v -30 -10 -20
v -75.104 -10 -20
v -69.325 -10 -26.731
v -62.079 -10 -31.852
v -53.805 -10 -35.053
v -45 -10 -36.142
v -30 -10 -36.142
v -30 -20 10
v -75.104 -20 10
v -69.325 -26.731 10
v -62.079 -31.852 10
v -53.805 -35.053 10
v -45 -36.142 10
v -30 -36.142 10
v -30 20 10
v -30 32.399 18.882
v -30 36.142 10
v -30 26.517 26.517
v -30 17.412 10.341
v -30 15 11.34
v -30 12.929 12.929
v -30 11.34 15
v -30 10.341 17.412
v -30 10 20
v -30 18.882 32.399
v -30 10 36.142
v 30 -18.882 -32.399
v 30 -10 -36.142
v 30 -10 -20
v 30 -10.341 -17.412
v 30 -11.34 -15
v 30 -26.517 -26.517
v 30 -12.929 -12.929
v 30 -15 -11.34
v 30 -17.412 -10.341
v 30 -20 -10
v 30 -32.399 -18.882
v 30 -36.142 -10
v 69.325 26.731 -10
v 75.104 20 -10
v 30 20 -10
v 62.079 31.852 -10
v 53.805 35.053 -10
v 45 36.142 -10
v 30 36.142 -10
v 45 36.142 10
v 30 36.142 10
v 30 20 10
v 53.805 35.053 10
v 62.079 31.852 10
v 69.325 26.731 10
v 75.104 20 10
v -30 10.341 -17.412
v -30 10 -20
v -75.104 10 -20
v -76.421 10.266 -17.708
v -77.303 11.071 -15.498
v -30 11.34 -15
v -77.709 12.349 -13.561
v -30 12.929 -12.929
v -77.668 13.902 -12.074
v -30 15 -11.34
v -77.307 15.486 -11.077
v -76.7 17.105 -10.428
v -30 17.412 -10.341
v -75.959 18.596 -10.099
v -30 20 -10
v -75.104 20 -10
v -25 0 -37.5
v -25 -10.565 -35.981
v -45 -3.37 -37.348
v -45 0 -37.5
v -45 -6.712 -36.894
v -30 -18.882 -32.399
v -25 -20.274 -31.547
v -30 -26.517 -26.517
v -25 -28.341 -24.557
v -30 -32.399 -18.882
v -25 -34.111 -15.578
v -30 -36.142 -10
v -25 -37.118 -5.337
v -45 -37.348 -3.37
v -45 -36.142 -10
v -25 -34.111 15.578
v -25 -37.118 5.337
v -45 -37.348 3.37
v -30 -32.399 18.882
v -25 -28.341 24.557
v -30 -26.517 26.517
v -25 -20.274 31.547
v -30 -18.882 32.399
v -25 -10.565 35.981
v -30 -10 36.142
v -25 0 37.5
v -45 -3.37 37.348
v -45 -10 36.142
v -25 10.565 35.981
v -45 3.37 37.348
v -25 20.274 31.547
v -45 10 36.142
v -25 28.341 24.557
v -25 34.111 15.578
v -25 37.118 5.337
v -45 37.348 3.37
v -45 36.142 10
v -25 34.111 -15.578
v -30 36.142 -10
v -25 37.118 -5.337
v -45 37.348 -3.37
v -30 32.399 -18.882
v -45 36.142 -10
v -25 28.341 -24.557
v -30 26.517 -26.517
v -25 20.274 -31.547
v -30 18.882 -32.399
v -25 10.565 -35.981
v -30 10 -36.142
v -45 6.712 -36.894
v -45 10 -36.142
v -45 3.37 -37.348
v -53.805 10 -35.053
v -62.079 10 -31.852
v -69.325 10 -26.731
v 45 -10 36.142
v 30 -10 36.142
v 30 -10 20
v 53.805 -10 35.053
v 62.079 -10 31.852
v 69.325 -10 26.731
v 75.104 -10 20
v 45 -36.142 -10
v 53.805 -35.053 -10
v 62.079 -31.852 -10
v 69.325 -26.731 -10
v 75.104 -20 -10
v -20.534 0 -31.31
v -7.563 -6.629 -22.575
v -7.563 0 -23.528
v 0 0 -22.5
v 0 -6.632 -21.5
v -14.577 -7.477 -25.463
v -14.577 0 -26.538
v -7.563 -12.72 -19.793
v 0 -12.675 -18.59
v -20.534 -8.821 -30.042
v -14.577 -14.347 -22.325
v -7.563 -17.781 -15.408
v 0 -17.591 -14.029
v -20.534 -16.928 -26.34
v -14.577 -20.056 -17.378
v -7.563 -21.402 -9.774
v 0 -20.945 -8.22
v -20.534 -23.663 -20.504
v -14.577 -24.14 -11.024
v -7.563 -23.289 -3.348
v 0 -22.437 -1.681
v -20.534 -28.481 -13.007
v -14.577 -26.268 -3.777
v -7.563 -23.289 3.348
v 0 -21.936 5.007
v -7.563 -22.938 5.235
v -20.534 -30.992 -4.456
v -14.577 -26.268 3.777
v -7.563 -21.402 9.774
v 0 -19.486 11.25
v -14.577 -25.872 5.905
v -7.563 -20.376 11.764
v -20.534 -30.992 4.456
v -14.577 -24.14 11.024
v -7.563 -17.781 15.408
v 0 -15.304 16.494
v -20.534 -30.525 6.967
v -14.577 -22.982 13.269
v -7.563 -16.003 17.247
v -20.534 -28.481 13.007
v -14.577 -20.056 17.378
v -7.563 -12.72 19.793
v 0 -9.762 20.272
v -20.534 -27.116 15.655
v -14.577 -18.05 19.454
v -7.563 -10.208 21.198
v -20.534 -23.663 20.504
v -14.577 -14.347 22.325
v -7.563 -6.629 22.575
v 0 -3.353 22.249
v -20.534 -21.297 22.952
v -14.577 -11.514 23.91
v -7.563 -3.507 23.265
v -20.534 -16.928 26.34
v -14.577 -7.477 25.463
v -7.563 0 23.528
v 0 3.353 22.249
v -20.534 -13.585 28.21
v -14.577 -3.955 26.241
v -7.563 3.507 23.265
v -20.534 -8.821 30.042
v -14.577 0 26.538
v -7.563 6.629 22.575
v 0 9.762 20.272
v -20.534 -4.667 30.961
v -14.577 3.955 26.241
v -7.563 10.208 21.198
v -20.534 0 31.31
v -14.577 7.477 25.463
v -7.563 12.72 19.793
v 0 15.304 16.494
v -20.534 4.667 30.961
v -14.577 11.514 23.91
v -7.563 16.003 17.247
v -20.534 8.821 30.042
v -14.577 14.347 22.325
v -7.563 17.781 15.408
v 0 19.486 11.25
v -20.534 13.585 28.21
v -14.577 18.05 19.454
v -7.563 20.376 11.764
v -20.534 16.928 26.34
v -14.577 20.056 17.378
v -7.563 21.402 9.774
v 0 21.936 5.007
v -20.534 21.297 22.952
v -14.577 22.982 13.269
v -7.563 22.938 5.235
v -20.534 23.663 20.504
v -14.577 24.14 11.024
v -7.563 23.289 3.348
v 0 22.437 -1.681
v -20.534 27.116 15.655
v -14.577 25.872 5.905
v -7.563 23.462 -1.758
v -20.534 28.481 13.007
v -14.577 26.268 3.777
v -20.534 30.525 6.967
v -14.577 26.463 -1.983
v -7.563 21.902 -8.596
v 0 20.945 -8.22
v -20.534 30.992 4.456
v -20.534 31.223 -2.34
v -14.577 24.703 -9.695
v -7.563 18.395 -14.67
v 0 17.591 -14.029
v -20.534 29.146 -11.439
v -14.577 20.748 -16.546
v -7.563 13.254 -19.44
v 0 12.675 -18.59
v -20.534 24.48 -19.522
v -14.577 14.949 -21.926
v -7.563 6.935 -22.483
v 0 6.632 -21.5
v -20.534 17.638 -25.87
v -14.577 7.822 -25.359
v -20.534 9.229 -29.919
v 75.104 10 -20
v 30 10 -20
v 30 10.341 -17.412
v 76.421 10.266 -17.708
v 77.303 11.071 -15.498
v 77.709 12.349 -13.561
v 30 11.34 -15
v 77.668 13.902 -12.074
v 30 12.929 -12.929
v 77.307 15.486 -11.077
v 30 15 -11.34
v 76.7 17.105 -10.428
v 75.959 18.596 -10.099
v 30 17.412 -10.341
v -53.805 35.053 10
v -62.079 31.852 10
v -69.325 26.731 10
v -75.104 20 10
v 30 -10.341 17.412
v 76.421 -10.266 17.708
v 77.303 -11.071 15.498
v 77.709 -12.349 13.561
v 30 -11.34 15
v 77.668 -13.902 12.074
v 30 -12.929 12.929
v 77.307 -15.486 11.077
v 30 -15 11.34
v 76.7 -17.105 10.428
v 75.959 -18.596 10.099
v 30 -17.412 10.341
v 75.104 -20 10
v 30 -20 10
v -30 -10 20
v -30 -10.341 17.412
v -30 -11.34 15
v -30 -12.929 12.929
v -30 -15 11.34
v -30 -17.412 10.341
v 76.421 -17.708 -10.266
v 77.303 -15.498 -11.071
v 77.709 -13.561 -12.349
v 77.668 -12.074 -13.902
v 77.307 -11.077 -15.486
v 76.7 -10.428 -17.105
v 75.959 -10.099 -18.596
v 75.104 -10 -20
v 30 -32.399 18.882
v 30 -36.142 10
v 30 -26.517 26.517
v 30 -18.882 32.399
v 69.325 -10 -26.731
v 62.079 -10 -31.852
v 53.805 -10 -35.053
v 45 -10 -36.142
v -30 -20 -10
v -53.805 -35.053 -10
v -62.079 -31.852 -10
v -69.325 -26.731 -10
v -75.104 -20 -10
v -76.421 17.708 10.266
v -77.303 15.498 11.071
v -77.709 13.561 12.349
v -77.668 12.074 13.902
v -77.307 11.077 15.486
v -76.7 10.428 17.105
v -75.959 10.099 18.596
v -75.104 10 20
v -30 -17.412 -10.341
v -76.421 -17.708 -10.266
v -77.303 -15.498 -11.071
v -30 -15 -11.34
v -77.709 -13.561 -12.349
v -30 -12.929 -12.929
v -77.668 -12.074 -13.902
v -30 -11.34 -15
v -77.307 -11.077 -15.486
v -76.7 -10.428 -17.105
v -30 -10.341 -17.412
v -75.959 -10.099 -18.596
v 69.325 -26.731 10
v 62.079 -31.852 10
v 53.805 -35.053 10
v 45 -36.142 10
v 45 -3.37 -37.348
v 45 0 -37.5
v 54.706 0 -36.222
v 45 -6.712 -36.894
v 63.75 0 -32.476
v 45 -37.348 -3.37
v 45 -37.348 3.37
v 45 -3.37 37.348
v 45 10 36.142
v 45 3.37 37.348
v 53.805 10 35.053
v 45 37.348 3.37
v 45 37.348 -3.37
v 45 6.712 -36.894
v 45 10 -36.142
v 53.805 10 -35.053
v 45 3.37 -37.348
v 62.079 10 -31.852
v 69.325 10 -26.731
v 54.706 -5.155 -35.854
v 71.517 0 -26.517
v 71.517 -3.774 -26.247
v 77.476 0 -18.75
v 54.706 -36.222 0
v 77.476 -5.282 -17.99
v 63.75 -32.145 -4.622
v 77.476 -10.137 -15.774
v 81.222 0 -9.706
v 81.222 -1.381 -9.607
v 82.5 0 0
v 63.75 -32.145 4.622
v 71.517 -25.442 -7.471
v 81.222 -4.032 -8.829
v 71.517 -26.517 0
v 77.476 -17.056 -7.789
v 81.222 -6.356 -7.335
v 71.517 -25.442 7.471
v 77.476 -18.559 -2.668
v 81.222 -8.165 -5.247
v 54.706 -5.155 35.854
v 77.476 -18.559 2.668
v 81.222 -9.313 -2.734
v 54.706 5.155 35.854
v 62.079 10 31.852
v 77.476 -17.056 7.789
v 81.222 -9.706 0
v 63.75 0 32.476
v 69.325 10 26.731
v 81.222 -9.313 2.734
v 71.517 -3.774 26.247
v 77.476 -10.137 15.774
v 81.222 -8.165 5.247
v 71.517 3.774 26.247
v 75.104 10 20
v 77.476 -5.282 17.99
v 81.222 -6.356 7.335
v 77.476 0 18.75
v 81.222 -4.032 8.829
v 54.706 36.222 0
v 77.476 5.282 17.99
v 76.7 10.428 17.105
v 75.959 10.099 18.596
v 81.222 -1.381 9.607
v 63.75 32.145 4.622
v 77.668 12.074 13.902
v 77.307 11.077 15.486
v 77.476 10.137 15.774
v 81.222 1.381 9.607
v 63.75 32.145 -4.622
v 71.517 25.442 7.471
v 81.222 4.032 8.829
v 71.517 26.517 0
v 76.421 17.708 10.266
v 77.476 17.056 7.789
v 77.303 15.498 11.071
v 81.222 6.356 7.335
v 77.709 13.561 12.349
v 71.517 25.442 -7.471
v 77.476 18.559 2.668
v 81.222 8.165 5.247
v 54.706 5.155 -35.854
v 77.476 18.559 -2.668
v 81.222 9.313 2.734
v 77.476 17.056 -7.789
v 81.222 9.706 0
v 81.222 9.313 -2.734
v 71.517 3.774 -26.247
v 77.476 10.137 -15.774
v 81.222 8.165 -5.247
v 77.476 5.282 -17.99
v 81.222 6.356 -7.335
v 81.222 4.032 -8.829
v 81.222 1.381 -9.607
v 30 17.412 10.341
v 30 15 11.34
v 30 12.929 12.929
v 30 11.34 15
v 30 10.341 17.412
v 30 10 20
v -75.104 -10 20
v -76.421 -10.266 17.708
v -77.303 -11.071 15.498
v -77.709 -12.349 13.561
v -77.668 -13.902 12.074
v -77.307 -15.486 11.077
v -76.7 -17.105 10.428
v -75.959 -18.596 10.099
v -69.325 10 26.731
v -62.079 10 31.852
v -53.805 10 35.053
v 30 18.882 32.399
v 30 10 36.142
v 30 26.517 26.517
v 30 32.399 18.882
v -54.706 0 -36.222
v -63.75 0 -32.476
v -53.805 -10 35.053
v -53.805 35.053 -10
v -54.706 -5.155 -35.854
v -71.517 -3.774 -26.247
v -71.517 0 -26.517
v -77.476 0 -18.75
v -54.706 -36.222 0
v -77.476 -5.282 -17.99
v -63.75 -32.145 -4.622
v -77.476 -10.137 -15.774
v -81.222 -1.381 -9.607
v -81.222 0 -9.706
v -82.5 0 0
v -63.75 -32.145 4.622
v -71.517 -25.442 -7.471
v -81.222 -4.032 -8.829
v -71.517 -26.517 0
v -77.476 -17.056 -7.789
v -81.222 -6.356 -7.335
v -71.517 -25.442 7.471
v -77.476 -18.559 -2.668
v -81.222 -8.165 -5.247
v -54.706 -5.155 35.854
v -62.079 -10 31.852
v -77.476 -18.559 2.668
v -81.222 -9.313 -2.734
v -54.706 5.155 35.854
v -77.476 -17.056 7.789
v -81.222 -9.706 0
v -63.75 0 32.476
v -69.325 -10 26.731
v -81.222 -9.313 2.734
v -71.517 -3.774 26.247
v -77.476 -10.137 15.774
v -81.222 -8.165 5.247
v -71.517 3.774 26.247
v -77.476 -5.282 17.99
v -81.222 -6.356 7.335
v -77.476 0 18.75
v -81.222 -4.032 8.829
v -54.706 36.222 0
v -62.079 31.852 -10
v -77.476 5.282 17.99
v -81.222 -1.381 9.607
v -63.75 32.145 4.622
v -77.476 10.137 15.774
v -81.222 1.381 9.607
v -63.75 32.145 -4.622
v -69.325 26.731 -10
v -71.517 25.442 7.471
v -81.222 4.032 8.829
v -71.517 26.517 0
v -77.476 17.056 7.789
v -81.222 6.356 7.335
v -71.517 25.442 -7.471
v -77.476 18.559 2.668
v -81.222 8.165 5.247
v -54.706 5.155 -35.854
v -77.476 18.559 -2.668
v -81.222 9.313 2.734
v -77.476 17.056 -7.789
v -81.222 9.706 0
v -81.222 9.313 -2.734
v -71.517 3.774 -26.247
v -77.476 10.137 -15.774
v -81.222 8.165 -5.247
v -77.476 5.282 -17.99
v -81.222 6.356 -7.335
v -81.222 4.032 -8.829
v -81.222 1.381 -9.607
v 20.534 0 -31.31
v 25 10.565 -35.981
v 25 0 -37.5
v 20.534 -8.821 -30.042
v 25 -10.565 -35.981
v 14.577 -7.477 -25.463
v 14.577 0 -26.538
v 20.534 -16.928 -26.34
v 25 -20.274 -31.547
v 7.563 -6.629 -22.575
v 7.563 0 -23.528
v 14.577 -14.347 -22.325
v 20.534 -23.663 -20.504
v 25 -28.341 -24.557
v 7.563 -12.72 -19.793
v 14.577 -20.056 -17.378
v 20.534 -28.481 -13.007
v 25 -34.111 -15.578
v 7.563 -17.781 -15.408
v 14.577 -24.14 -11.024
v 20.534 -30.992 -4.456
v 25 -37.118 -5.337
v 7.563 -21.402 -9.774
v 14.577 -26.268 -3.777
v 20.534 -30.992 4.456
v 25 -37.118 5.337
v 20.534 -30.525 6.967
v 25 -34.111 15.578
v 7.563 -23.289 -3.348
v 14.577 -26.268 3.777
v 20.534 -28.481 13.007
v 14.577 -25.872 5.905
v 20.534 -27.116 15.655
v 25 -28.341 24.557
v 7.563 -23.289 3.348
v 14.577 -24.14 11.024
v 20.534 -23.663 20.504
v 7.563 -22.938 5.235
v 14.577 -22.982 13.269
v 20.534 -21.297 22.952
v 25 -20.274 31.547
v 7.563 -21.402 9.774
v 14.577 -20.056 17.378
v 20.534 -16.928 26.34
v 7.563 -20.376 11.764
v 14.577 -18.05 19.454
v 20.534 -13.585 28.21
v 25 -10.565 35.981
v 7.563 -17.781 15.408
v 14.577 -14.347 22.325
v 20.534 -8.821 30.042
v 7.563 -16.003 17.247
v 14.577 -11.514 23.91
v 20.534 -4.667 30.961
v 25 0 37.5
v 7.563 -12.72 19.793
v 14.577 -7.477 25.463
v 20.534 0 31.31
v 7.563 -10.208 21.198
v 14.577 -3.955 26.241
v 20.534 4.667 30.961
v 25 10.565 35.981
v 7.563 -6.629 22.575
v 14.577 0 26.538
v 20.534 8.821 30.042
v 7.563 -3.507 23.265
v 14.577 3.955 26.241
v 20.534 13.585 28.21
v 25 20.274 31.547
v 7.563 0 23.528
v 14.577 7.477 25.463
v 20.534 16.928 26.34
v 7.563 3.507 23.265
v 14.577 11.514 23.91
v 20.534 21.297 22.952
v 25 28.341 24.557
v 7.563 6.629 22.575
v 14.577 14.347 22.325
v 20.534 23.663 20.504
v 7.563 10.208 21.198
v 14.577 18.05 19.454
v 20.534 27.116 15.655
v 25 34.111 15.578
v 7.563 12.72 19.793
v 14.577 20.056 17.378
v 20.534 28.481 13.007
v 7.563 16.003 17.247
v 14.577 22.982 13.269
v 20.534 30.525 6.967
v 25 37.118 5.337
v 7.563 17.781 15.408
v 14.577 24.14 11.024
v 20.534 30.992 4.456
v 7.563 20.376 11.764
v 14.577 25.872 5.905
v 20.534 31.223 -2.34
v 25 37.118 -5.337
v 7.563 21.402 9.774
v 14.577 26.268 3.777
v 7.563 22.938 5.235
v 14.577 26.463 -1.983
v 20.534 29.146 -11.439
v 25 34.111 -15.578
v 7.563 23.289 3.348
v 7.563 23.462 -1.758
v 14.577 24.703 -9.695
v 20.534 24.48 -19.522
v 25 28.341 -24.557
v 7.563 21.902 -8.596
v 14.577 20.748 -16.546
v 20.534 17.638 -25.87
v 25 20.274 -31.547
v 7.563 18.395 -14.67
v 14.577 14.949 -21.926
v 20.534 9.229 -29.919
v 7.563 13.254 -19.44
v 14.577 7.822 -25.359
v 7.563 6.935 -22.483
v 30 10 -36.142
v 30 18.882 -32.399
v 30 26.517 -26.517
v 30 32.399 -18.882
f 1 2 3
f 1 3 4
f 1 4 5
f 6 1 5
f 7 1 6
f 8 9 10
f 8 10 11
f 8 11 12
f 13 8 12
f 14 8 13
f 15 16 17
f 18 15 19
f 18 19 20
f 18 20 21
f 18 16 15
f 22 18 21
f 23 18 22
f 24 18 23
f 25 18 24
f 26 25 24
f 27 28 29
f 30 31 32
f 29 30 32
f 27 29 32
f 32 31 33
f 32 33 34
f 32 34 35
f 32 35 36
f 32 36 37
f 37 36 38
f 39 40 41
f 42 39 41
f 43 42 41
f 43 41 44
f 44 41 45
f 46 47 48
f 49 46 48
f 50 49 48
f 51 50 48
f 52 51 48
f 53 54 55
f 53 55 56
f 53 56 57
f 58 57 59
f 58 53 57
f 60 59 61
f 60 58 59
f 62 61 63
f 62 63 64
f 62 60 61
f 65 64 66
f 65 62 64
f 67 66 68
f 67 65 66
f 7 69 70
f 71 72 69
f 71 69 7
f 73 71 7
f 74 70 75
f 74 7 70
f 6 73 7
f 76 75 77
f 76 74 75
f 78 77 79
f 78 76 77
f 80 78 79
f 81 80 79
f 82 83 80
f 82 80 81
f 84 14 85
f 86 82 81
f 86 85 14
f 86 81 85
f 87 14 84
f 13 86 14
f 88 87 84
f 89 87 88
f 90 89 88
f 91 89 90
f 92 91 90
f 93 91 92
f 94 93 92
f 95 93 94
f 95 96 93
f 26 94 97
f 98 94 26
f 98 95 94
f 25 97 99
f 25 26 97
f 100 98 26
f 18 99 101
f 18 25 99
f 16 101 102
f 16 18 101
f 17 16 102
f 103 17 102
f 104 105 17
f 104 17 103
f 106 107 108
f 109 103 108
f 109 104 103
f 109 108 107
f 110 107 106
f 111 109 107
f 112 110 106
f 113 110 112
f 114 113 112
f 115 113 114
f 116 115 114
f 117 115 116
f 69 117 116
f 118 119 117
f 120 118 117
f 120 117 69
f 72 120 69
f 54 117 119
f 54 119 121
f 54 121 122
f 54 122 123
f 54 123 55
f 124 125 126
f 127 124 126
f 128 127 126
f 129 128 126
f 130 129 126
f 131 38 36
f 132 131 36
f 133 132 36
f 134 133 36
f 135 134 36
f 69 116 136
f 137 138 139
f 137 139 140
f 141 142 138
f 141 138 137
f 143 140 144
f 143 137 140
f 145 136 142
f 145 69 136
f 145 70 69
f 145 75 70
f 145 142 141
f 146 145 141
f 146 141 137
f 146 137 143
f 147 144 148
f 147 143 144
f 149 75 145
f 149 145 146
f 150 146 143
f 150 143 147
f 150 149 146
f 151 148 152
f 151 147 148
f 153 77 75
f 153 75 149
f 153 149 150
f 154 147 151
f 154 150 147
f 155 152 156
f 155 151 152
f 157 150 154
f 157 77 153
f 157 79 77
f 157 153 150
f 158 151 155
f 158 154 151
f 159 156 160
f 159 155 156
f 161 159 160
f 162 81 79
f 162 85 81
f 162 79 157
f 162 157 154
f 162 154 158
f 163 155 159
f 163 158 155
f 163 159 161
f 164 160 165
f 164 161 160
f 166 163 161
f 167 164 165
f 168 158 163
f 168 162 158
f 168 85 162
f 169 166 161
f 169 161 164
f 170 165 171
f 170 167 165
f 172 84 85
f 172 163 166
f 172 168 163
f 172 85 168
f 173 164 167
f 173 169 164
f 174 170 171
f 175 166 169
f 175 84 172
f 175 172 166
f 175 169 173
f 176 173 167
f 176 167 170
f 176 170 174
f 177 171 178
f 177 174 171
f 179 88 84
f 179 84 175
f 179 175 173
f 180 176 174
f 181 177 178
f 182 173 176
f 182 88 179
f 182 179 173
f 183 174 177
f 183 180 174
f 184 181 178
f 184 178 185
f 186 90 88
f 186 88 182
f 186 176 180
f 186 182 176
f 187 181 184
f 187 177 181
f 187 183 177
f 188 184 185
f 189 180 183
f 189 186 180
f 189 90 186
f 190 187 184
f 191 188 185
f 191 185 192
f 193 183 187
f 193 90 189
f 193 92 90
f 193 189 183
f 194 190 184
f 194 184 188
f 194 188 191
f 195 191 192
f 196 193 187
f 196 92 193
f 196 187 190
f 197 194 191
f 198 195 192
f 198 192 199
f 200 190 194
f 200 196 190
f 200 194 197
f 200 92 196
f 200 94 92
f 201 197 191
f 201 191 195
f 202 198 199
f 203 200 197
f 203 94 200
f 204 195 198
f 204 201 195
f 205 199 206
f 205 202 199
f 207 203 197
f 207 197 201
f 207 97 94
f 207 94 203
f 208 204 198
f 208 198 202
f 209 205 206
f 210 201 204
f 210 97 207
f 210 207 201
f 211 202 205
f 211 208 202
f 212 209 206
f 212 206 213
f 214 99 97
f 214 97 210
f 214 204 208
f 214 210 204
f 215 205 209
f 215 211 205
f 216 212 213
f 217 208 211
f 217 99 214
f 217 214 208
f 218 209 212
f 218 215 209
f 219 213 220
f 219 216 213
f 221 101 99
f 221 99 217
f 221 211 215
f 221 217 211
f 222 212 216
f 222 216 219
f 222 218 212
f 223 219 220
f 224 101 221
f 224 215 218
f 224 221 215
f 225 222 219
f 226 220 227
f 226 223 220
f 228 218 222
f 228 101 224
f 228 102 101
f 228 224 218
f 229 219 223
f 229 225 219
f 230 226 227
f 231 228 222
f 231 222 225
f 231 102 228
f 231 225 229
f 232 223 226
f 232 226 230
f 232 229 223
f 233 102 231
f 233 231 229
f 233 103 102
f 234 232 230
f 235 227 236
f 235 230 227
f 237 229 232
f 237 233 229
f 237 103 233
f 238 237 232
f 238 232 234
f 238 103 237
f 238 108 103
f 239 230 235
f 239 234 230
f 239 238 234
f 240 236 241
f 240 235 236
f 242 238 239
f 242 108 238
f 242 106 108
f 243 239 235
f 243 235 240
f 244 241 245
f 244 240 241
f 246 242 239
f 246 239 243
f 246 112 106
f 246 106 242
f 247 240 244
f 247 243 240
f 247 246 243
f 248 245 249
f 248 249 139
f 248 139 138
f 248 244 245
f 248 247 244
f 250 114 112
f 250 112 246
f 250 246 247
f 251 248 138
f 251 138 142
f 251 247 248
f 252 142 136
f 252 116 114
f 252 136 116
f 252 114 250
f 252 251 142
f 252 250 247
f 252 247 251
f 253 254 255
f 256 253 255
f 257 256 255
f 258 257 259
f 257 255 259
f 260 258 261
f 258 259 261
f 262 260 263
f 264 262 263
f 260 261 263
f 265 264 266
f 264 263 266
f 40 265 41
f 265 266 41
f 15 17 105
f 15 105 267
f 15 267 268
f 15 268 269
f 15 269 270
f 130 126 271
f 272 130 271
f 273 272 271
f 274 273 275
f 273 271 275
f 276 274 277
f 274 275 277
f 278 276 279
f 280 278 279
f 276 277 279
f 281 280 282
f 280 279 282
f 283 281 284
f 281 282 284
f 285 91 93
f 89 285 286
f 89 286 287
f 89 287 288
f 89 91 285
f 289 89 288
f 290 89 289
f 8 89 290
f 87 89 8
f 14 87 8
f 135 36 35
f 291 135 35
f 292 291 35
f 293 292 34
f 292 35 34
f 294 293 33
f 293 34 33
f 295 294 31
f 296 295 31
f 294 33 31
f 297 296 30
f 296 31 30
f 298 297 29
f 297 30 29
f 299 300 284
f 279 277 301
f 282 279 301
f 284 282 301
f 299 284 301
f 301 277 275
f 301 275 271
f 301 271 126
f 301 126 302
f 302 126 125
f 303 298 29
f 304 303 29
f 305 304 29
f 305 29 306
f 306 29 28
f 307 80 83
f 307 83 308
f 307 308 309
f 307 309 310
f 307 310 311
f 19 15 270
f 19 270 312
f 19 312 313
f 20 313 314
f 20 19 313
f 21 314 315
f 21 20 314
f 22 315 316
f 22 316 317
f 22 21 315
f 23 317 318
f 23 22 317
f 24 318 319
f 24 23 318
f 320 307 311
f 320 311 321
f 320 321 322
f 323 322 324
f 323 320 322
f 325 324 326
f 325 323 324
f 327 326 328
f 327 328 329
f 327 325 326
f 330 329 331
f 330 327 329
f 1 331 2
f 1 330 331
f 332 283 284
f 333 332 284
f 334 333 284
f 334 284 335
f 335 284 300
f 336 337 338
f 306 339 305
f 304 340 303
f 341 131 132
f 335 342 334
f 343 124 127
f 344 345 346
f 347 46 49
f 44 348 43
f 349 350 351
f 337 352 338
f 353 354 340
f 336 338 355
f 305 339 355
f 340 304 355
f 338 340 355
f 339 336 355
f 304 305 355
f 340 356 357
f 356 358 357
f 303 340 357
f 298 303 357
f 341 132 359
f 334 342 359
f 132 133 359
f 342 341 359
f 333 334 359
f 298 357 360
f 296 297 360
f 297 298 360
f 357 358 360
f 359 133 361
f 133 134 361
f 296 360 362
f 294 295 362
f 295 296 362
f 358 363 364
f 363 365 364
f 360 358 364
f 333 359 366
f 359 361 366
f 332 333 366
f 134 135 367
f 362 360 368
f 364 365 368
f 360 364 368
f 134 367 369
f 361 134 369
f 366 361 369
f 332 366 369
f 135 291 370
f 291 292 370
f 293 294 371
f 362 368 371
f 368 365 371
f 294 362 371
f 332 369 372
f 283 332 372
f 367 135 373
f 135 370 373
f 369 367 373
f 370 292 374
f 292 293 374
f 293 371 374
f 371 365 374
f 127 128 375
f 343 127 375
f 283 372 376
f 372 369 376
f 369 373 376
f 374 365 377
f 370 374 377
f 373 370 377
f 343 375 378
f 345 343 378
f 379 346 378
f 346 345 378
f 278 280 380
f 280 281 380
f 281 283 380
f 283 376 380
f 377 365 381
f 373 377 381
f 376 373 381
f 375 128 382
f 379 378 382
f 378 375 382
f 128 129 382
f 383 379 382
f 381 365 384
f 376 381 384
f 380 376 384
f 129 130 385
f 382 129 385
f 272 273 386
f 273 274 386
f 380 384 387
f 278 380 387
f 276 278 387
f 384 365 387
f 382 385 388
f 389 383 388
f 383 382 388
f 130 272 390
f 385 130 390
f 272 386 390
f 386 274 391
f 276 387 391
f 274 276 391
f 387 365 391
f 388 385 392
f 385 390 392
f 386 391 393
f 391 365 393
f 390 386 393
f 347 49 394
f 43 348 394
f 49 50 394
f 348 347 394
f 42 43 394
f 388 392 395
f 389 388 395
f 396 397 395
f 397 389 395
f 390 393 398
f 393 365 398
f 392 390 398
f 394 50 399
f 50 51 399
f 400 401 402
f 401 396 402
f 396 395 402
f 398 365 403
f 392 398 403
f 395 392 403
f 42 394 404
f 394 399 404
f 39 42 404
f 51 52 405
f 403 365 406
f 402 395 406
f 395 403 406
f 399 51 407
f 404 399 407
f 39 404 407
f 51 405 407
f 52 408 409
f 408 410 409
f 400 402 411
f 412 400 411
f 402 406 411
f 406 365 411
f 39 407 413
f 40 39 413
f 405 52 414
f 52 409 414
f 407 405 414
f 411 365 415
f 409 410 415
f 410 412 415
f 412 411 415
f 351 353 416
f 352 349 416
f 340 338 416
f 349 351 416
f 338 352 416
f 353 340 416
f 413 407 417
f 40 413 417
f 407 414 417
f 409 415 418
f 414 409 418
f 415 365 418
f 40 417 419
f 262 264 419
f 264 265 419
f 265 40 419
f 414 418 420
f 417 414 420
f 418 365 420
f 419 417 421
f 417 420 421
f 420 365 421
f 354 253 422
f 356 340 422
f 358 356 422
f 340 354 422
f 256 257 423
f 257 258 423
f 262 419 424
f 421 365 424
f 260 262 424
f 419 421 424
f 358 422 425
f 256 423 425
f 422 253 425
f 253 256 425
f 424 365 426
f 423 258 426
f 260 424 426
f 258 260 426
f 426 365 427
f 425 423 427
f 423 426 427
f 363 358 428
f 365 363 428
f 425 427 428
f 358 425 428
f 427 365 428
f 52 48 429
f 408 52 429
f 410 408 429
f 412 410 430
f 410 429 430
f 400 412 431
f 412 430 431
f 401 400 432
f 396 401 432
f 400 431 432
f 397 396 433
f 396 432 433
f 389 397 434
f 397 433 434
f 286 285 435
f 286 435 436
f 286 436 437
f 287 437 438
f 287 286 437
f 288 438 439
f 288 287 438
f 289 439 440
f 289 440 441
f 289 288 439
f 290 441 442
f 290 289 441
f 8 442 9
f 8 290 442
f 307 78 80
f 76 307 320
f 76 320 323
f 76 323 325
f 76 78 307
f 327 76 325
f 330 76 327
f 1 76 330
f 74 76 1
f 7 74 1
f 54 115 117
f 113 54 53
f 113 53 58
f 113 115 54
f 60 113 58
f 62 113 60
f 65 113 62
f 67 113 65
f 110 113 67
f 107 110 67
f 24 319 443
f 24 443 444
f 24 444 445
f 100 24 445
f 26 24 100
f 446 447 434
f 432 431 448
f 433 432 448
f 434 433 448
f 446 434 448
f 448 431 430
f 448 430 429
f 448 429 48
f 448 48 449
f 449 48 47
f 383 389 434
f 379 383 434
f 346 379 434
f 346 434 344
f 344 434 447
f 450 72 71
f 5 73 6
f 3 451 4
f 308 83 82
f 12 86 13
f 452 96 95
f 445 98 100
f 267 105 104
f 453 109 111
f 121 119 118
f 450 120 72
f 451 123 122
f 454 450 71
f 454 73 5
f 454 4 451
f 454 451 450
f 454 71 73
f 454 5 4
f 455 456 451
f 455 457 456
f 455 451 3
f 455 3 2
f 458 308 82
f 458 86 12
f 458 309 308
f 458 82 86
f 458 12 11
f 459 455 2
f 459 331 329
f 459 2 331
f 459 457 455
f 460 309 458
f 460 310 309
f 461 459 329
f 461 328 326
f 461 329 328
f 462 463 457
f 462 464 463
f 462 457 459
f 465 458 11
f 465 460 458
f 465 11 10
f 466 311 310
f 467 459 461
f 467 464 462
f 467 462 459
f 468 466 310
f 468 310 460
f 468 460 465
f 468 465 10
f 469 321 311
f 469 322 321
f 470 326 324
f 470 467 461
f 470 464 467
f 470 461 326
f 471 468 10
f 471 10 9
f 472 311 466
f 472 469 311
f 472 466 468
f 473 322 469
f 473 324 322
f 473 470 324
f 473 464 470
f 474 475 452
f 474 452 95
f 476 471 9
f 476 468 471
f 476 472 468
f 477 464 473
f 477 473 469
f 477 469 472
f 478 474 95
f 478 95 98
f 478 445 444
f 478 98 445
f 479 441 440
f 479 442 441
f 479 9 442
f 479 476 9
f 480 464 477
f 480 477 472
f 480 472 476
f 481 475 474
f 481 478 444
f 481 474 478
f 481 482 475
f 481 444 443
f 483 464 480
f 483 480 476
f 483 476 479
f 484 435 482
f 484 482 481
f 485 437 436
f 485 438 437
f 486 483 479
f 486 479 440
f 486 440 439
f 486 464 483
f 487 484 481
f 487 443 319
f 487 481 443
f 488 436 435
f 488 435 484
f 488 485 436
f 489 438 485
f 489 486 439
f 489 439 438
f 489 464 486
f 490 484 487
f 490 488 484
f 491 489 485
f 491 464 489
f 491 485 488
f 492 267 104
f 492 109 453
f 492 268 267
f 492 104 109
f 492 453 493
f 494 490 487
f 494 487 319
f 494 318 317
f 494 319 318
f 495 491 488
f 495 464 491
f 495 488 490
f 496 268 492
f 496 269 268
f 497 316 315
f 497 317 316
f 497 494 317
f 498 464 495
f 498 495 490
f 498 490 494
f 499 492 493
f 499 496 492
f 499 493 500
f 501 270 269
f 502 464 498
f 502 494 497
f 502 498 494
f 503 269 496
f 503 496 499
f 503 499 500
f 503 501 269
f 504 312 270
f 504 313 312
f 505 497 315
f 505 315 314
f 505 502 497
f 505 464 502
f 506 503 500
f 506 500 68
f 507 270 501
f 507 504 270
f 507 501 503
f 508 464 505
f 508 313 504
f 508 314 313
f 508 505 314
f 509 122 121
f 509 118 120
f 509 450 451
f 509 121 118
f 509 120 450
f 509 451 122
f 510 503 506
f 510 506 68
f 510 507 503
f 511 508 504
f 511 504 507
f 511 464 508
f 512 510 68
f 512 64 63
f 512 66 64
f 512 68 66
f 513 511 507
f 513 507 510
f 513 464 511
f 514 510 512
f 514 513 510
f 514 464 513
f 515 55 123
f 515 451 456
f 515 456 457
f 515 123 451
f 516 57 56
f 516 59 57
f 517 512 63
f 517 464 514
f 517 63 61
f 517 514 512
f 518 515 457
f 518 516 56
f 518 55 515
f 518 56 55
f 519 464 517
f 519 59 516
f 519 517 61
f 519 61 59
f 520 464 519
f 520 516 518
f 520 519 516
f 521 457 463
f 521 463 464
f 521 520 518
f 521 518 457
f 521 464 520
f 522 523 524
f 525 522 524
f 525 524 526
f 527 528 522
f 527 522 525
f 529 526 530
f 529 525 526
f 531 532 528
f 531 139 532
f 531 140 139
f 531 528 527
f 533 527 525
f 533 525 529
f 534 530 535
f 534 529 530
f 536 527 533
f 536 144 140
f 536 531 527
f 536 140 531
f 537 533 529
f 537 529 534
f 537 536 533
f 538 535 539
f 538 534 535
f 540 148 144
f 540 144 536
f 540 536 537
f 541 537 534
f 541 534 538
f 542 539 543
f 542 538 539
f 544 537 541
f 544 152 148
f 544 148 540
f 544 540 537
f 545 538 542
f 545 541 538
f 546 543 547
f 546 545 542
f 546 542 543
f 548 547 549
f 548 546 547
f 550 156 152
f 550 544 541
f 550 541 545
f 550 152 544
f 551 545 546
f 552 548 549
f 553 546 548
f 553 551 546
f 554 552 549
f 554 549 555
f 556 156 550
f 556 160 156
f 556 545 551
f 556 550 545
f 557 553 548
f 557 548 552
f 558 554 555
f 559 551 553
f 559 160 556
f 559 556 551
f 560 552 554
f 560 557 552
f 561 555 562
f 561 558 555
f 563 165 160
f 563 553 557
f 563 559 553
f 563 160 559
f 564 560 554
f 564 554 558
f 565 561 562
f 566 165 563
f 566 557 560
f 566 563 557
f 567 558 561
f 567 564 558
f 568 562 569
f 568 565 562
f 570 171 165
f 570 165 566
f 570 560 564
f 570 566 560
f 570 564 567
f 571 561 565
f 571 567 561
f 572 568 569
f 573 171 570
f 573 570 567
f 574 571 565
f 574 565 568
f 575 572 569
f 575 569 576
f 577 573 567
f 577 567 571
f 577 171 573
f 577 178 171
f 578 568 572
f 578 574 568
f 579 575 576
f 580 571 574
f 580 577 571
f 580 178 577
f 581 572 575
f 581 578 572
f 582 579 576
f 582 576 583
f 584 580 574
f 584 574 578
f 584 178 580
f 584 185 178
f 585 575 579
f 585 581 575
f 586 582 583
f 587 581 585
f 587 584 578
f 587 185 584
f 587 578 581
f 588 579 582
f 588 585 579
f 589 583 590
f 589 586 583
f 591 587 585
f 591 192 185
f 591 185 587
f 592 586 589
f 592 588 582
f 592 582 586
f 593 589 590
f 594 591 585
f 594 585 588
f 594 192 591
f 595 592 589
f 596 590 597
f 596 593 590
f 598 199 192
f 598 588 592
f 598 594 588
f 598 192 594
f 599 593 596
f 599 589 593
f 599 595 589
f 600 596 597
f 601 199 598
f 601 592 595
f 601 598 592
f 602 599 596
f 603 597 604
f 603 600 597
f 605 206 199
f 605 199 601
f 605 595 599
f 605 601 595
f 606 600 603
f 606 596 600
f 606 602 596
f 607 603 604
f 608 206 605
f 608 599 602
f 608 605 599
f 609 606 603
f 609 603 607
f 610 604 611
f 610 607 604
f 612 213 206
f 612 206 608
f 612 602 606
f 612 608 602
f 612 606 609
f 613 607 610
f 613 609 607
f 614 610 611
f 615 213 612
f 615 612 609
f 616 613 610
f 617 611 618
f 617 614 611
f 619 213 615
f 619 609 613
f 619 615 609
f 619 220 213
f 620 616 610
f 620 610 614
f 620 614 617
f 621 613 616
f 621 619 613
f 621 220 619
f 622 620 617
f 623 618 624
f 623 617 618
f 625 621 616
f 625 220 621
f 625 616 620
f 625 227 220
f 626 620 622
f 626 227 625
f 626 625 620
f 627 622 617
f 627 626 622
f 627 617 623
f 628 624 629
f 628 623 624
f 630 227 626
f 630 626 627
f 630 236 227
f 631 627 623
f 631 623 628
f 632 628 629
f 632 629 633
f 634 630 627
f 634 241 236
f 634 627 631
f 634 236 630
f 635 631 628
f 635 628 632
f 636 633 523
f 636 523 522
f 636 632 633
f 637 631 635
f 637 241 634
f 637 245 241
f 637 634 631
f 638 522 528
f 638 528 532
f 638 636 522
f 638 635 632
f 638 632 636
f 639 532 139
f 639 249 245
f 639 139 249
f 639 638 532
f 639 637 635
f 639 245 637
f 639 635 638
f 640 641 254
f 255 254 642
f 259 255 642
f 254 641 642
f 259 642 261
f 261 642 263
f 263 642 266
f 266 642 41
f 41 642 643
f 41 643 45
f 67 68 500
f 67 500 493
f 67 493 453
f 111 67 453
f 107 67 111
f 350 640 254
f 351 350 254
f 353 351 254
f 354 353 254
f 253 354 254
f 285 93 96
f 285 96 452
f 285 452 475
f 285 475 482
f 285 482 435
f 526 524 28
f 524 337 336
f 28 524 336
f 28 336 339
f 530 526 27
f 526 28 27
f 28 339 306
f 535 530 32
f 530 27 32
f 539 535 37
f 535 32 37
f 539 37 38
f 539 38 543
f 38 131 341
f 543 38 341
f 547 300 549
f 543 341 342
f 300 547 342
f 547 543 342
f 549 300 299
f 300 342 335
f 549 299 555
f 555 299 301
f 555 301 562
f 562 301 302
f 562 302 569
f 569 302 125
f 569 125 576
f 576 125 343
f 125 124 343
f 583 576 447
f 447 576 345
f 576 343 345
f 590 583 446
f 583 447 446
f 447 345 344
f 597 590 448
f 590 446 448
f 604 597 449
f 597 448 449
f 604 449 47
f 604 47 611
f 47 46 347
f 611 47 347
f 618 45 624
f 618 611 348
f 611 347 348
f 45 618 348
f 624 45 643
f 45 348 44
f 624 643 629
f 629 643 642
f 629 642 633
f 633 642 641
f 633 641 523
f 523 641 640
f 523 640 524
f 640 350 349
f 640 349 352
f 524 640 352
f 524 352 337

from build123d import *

# Parameters (mm, degrees)
SKETCH_1_W               = 5
SKETCH_1_H               = 37.5
CUT_EXTRUDE_1_DEPTH      = 77.40353395
PATTERN_CIRCULAR_1_COUNT = 4
MIRROR_2_COPY_1_DEPTH    = 77.40353395
MIRROR_2_COPY_2_DEPTH    = 77.40353395
MIRROR_2_COPY_3_DEPTH    = 77.40353395


with BuildPart() as part:
    # 草图1 → 旋转1 (revolve)
    with BuildSketch(Plane(origin=(0, 0, 0), x_dir=(1, 0, 0), z_dir=(0, 1, 0))):
        with BuildLine():
            Line((-82.5, 0), (-30, 0))
            Line((-30, 0), (-30, 37.5))
            Line((-30, 37.5), (-45, 37.5))
            ThreePointArc((-45, 37.5), (-71.516504294, 26.516504294), (-82.5, 0))
        make_face()
        with Locations((-27.5, 18.75)):
            Rectangle(SKETCH_1_W, SKETCH_1_H)
        with BuildLine():
            Line((-25, 0), (0, 0))
            Line((0, 0), (0, 22.5))
            ThreePointArc((0, 22.5), (-14.577379737, 26.537700438), (-25, 37.5))
            Line((-25, 37.5), (-25, 0))
        make_face()
        with BuildLine():
            Line((0, 22.5), (0, 0))
            Line((0, 0), (25, 0))
            Line((25, 0), (25, 37.5))
            ThreePointArc((25, 37.5), (14.577379737, 26.537700438), (0, 22.5))
        make_face()
    revolve_1 = revolve(axis=Axis((0, 0, 0), (-1, 0, 0)))

    # 草图2 → 切除-拉伸1 (cut, through all)
    with BuildSketch(Plane(origin=(-30, 0, 0), x_dir=(0, 0, -1), z_dir=(1, 0, 0))):
        with BuildLine():
            Line((10, 54.755645053), (54.446031679, 54.755645053))
            Line((54.446031679, 54.755645053), (54.446031679, 10))
            Line((54.446031679, 10), (20, 10))
            ThreePointArc((20, 10), (12.928932188, 12.928932188), (10, 20))
            Line((10, 20), (10, 54.755645053))
        make_face()
    cut_extrude_1 = extrude(amount=-CUT_EXTRUDE_1_DEPTH, mode=Mode.SUBTRACT)

    # 阵列(圆周)1: 切除-拉伸1 ×4 about axis
    pattern_circular_1_axis = Axis((0, 0, 0), (1, 0, 0))
    for i in range(1, PATTERN_CIRCULAR_1_COUNT):
        add(cut_extrude_1.rotate(pattern_circular_1_axis, i * 360 / PATTERN_CIRCULAR_1_COUNT), mode=Mode.SUBTRACT)

    # 镜向2: 旋转1, 切除-拉伸1 across plane
    add(revolve_1.mirror(Plane(origin=(0, 0, 0), x_dir=(0, 0, 1), z_dir=(1, 0, 0))))
    add(cut_extrude_1.mirror(Plane(origin=(0, 0, 0), x_dir=(0, 0, 1), z_dir=(1, 0, 0))), mode=Mode.SUBTRACT)

    # 镜向2 copy 1 sketch → 镜向2 copy 1 (cut, through all)
    with BuildSketch(Plane(origin=(30, 0, 0), x_dir=(0, 1, 0), z_dir=(-1, 0, 0))):
        with BuildLine():
            Line((10, -54.755645053), (54.446031679, -54.755645053))
            Line((54.446031679, -54.755645053), (54.446031679, -10))
            Line((54.446031679, -10), (20, -10))
            ThreePointArc((20, -10), (12.928932188, -12.928932188), (10, -20))
            Line((10, -20), (10, -54.755645053))
        make_face()
    extrude(amount=-MIRROR_2_COPY_1_DEPTH, mode=Mode.SUBTRACT)

    # 镜向2 copy 2 sketch → 镜向2 copy 2 (cut, through all)
    with BuildSketch(Plane.ZY.offset(-30)):
        with BuildLine():
            Line((10, -54.755645053), (54.446031679, -54.755645053))
            Line((54.446031679, -54.755645053), (54.446031679, -10))
            Line((54.446031679, -10), (20, -10))
            ThreePointArc((20, -10), (12.928932188, -12.928932188), (10, -20))
            Line((10, -20), (10, -54.755645053))
        make_face()
    extrude(amount=-MIRROR_2_COPY_2_DEPTH, mode=Mode.SUBTRACT)

    # 镜向2 copy 3 sketch → 镜向2 copy 3 (cut, through all)
    with BuildSketch(Plane(origin=(30, 0, 0), x_dir=(0, -1, 0), z_dir=(-1, 0, 0))):
        with BuildLine():
            Line((10, -54.755645053), (54.446031679, -54.755645053))
            Line((54.446031679, -54.755645053), (54.446031679, -10))
            Line((54.446031679, -10), (20, -10))
            ThreePointArc((20, -10), (12.928932188, -12.928932188), (10, -20))
            Line((10, -20), (10, -54.755645053))
        make_face()
    extrude(amount=-MIRROR_2_COPY_3_DEPTH, mode=Mode.SUBTRACT)


solid = part.part
